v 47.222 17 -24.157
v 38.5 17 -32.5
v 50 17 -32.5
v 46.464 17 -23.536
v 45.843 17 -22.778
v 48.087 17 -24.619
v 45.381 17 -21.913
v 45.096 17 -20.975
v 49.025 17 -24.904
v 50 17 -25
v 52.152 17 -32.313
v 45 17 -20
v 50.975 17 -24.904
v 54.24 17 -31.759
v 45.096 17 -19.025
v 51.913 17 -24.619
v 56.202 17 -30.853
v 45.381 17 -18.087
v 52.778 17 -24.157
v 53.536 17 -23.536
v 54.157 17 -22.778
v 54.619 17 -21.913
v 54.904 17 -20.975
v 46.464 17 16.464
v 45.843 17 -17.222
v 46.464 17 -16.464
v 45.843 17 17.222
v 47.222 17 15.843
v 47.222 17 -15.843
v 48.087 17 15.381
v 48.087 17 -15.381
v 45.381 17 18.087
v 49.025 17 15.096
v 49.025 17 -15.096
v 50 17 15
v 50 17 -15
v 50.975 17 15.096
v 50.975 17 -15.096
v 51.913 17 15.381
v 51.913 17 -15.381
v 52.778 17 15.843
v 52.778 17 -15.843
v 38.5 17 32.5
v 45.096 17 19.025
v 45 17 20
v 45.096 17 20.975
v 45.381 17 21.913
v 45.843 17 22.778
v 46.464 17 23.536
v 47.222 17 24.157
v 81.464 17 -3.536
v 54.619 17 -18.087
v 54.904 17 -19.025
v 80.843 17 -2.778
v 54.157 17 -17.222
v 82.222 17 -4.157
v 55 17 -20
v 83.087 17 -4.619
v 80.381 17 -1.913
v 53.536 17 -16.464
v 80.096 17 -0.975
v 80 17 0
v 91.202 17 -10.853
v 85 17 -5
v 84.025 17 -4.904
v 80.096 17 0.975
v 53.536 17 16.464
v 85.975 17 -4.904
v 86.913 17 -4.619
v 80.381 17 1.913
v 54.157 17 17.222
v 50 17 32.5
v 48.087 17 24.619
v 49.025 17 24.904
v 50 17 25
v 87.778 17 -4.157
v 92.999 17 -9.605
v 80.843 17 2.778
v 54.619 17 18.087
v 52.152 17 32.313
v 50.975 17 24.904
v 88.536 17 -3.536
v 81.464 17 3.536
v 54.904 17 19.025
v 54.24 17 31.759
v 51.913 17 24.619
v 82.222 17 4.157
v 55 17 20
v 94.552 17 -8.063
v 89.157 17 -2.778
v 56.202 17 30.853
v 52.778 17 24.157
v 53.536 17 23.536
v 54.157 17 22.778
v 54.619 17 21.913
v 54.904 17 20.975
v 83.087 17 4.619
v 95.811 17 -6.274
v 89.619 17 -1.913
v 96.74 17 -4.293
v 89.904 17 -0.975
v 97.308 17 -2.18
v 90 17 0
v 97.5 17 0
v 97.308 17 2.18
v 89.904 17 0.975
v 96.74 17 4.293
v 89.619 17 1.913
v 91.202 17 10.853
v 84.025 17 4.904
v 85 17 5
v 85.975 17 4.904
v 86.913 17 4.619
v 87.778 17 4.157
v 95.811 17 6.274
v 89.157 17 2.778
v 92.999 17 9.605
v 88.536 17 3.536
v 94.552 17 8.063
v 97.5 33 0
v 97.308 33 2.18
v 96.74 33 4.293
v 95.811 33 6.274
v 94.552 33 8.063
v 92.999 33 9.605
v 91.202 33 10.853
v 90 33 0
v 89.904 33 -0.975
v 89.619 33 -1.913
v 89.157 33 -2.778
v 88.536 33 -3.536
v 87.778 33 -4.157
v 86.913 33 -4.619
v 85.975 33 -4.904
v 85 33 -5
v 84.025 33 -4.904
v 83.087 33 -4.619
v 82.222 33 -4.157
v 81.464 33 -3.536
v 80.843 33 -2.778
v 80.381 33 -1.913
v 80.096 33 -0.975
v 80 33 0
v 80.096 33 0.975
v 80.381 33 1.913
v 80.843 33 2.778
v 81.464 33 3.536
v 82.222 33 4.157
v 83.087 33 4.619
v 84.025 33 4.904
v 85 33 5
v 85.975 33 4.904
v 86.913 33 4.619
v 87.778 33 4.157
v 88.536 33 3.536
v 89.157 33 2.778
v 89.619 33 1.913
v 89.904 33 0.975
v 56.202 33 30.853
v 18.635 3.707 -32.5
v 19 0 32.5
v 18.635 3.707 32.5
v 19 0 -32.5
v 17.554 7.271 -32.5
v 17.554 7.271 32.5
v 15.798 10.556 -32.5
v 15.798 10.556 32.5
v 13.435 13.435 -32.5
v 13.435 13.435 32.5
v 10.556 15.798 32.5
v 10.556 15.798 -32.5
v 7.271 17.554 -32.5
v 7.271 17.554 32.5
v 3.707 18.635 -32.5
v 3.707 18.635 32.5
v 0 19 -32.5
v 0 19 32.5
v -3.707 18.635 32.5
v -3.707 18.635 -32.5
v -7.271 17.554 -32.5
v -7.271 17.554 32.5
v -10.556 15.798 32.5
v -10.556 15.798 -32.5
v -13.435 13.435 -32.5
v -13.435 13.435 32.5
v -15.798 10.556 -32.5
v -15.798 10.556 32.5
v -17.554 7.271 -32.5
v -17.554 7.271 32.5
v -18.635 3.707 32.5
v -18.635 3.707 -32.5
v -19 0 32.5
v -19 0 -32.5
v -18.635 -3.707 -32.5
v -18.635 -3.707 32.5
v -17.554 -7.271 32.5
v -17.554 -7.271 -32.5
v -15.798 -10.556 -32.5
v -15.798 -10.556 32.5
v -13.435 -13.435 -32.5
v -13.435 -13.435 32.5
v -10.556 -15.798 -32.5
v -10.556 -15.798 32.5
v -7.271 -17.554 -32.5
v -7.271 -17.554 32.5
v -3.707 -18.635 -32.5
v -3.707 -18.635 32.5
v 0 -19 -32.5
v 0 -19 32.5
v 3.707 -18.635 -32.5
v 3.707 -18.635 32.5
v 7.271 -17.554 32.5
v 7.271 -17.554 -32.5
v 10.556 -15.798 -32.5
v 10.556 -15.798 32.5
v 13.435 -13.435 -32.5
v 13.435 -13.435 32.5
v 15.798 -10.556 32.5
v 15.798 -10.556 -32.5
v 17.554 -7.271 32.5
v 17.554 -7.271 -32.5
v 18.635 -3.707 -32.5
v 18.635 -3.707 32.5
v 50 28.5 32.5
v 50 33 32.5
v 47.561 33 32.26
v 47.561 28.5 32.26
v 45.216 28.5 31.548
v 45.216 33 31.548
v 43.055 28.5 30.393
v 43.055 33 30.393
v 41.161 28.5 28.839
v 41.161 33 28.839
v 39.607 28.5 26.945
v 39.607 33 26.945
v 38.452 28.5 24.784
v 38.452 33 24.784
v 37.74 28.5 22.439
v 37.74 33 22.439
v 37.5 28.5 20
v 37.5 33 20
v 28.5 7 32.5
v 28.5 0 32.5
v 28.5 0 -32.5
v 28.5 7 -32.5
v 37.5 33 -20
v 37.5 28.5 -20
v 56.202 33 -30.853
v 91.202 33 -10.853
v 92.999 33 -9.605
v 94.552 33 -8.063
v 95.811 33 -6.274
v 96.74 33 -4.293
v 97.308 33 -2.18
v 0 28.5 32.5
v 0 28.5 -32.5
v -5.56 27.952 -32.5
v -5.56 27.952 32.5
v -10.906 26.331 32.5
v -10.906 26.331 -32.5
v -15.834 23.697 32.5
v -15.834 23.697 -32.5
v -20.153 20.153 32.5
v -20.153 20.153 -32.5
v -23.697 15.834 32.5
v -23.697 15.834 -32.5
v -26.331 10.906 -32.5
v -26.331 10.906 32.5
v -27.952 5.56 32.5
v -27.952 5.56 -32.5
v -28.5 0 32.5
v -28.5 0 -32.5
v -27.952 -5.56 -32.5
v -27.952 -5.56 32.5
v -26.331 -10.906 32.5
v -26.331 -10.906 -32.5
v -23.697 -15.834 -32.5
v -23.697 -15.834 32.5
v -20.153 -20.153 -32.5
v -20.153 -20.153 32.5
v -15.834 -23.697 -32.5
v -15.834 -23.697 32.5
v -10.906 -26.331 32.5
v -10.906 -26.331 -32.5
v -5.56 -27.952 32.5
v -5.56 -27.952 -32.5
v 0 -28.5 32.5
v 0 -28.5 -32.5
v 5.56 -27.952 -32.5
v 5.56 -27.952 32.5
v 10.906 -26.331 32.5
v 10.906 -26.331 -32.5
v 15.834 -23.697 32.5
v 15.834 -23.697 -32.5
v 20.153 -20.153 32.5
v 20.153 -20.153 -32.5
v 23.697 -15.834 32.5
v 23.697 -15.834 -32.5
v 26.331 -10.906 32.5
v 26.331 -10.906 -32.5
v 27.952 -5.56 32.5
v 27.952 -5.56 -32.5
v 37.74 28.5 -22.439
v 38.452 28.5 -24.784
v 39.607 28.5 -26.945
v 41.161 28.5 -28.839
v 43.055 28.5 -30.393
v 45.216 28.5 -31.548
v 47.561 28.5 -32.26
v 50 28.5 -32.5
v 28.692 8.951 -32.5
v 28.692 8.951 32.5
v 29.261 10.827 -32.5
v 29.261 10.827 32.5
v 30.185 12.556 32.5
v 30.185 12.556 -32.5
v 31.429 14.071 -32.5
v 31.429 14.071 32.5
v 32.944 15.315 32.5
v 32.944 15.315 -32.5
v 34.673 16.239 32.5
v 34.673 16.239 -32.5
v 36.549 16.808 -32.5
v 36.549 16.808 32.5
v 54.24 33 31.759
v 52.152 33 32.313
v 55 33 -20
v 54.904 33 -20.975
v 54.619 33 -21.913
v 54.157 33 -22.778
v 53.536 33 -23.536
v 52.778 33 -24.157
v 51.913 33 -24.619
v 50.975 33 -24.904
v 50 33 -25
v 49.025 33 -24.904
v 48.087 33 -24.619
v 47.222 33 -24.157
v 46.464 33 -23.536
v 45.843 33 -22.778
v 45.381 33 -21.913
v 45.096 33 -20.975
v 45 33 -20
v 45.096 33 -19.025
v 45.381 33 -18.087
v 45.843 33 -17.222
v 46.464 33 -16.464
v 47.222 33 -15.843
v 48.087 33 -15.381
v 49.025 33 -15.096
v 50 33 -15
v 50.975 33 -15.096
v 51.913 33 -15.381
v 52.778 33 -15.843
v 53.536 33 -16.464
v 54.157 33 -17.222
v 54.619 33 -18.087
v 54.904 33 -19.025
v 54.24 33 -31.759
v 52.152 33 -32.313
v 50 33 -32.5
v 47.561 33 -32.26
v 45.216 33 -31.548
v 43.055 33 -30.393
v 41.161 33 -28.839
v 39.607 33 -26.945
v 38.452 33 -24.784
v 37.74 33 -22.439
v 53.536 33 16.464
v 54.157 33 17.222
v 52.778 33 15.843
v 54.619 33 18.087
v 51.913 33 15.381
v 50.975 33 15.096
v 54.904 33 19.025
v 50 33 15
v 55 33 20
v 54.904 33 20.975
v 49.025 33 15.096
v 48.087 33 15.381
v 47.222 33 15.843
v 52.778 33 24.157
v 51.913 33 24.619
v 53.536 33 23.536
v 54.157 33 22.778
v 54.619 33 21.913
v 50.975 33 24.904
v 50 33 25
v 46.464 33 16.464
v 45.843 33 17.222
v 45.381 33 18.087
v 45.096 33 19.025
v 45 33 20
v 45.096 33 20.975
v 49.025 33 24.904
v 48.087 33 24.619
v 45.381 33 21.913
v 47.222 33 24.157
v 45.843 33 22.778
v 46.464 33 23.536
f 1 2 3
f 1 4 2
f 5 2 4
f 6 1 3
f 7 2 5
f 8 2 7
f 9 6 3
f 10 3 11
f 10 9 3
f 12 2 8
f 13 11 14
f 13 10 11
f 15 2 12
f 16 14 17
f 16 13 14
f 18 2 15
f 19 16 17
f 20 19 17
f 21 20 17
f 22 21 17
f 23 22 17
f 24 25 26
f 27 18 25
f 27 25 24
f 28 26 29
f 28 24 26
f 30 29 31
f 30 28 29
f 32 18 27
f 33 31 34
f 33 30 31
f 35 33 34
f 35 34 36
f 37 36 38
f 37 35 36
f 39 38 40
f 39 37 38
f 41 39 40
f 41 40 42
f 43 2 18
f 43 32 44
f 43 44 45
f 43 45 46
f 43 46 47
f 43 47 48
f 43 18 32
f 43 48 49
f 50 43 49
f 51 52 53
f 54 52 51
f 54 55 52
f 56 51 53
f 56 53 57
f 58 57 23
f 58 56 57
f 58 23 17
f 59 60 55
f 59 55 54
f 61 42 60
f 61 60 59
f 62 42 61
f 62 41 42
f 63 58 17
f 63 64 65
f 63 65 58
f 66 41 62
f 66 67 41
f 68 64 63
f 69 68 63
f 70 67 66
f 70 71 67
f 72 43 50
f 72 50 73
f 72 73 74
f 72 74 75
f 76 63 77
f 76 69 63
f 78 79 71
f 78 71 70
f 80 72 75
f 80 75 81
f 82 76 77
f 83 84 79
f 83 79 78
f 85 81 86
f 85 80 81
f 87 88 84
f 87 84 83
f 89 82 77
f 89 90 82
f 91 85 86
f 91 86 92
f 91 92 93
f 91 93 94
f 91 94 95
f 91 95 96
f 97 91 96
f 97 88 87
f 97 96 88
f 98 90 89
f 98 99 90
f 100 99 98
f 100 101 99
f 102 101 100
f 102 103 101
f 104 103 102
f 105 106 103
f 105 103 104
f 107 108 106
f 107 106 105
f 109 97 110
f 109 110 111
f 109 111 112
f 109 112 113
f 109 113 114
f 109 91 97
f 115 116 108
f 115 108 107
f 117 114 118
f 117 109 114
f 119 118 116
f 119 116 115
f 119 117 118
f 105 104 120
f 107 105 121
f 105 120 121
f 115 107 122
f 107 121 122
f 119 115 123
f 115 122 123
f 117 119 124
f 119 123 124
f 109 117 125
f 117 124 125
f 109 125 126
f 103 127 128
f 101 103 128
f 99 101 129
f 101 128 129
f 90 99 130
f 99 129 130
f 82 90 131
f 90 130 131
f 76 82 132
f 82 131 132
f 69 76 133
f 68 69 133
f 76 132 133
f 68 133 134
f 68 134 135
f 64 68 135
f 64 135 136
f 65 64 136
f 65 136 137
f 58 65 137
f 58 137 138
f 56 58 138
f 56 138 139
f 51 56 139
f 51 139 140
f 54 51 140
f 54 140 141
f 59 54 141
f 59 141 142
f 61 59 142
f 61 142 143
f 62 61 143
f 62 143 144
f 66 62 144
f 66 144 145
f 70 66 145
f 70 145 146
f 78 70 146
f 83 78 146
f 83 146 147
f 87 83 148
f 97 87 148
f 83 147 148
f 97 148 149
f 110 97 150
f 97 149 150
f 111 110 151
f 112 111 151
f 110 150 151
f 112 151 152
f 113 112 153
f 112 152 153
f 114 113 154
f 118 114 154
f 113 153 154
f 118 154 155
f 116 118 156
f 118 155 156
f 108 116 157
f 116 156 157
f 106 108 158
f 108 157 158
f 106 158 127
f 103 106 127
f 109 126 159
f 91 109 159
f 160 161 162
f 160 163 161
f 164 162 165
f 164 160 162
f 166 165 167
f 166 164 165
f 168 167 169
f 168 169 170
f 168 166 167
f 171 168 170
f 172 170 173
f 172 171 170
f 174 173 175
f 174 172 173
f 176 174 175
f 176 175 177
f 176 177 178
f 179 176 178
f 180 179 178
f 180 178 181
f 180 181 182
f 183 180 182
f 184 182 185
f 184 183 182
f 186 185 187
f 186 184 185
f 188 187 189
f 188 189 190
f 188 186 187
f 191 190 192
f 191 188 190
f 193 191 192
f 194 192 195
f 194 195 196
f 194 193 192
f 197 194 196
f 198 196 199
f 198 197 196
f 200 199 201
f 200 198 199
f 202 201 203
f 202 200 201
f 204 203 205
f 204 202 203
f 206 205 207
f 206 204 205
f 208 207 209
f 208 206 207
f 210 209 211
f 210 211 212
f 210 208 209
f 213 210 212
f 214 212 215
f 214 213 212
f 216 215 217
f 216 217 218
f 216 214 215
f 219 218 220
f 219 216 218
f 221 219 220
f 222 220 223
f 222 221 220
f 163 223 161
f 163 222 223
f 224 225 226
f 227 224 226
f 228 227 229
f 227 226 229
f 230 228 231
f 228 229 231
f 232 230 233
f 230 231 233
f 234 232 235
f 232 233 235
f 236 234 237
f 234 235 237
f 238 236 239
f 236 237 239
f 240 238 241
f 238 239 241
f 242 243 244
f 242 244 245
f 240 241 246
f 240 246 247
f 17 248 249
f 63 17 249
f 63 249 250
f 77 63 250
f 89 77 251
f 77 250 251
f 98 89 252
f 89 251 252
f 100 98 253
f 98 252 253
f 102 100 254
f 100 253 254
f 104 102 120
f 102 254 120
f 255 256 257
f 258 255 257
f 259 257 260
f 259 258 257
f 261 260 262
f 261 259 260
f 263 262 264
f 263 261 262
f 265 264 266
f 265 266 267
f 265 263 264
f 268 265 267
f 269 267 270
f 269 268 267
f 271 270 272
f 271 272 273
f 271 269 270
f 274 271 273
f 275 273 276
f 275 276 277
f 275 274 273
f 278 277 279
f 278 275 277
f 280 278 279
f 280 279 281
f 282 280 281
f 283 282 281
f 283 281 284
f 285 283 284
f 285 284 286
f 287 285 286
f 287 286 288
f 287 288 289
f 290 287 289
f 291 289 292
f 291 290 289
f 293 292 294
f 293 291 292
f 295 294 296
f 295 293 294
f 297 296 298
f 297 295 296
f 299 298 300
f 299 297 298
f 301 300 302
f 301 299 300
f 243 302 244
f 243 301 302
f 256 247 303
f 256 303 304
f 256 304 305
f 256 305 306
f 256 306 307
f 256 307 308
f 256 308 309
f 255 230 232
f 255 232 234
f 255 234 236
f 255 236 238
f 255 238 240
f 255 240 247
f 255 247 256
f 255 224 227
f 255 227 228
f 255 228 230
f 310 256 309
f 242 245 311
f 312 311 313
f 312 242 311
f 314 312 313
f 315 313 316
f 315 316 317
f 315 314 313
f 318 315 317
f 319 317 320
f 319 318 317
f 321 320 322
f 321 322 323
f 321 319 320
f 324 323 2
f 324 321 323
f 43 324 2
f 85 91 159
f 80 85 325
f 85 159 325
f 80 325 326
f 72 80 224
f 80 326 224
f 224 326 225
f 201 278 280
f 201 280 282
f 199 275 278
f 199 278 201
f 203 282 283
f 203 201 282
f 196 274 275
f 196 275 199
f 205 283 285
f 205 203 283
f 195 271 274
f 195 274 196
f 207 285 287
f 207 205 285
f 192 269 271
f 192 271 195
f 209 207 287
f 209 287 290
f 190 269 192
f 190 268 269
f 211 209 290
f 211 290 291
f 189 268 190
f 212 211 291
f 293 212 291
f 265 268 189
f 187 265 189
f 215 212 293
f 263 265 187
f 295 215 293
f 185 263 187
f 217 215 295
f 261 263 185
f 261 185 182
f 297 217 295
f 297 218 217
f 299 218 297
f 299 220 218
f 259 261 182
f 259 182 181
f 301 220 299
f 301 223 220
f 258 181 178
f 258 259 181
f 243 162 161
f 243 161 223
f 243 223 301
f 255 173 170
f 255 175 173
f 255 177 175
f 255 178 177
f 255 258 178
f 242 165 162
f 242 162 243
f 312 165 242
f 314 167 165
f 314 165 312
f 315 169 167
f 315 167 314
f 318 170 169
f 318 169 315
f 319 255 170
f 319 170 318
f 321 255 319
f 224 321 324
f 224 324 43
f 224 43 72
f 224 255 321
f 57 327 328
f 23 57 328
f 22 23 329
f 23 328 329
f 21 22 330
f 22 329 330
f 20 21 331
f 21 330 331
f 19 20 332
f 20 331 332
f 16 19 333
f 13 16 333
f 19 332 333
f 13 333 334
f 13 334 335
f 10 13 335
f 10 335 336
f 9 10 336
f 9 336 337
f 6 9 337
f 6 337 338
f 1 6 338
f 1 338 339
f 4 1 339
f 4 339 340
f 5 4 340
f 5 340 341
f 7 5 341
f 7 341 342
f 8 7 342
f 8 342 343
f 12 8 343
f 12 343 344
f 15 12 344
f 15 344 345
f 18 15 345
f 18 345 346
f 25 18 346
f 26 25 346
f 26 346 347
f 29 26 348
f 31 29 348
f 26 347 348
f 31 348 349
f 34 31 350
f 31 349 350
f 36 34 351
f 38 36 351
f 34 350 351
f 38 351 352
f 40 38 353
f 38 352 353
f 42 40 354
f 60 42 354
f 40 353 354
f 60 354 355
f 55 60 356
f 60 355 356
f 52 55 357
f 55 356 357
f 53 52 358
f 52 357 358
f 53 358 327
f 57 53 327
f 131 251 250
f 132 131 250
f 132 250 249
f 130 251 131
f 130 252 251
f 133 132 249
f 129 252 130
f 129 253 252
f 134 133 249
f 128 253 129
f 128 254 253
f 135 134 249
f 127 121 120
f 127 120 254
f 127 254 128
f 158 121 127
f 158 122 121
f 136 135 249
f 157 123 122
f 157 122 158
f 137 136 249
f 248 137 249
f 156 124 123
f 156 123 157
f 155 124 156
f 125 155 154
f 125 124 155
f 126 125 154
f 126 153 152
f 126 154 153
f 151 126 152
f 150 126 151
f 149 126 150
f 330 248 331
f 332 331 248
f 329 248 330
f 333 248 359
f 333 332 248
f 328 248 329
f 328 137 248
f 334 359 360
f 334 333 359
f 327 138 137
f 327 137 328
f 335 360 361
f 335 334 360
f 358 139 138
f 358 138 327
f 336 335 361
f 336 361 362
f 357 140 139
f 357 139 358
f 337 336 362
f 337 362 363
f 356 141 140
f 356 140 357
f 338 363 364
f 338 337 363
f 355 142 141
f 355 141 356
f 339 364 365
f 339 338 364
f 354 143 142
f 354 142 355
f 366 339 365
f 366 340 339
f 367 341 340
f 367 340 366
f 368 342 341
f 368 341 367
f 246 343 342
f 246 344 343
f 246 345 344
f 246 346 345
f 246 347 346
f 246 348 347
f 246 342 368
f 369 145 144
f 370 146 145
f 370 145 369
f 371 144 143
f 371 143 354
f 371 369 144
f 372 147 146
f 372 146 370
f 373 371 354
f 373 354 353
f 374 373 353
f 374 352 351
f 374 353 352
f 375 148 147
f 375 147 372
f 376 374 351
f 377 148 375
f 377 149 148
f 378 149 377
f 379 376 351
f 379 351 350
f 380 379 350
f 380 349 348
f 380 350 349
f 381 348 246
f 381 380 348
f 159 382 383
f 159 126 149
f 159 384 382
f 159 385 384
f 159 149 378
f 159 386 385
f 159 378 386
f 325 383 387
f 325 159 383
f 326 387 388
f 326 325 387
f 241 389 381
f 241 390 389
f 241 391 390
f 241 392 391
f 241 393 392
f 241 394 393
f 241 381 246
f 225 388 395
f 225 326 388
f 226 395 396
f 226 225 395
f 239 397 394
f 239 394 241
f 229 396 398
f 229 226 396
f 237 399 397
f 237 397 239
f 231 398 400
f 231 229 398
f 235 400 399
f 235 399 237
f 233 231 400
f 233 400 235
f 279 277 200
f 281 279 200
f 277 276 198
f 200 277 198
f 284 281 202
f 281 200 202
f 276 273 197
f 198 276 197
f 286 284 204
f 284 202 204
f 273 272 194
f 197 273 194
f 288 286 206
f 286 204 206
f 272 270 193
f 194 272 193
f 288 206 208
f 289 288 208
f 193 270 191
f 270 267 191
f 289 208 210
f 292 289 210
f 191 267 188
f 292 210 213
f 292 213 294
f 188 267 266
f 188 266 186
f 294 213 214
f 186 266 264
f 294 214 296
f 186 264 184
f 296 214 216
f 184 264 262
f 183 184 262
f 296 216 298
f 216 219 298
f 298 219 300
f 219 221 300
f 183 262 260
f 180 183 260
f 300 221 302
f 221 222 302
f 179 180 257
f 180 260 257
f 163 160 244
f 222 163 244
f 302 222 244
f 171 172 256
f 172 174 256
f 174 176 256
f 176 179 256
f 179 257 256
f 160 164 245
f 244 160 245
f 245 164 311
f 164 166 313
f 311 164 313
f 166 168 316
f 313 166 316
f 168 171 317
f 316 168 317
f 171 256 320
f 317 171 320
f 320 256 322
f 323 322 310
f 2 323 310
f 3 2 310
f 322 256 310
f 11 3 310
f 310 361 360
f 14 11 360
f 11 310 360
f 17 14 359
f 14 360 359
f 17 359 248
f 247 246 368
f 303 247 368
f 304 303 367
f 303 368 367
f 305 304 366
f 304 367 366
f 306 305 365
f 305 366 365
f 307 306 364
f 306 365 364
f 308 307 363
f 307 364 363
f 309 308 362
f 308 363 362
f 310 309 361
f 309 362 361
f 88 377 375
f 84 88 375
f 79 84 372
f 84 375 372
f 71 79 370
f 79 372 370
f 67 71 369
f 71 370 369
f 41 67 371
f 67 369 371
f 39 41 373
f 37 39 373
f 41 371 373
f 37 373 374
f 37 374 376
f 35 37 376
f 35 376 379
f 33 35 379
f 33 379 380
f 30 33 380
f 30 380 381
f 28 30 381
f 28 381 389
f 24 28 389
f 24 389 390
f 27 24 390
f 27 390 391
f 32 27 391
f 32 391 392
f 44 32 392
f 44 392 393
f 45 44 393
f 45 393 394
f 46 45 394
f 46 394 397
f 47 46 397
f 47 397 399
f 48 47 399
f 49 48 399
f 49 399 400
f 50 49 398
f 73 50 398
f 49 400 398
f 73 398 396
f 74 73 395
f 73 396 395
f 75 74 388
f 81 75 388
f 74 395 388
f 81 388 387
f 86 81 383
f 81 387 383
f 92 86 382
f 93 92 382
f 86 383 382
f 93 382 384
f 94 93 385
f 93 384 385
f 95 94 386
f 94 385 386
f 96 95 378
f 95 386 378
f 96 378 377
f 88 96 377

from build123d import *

# Parameters (mm, degrees)
SKETCH1_R           = 19
BOSS_EXTRUDE1_DEPTH = 32.5
CUT_EXTRUDE3_REACH  = 121.77
SKETCH2_R           = 5
CUT_EXTRUDE4_DEPTH  = 4.5


with BuildPart() as part:
    # Sketch1 → Boss-Extrude1 (new, symmetric)
    with BuildSketch(Plane.XY):
        with BuildLine():
            Line((37.5, 28.5), (0, 28.5))
            ThreePointArc((0, 28.5), (-20.152543264, -20.152543264), (28.5, 0))
            Line((28.5, 0), (28.5, 7))
            ThreePointArc((28.5, 7), (31.428932188, 14.071067812), (38.5, 17))
            Line((38.5, 17), (97.5, 17))
            Line((97.5, 17), (97.5, 33))
            Line((97.5, 33), (37.5, 33))
            Line((37.5, 33), (37.5, 28.5))
        make_face()
        Circle(SKETCH1_R, mode=Mode.SUBTRACT)
    extrude(amount=BOSS_EXTRUDE1_DEPTH, both=True)

    # Sketch2 → Cut-Extrude3 (cut, up to next)
    with BuildSketch(Plane(origin=(0, 33, 0), x_dir=(1, 0, 0), z_dir=(0, 1, 0)), mode=Mode.PRIVATE) as cut_extrude3_sk1:
        with BuildLine():
            ThreePointArc((56.201736729, -30.853039277), (53.208349189, -32.08124561), (50, -32.5))
            Line((50, -32.5), (97.5, -32.5))
            Line((97.5, -32.5), (97.5, 1.68e-07))
            ThreePointArc((97.5, 1.68e-07), (95.811376206, -6.274085155), (91.201736729, -10.853039277))
            Line((91.201736729, -10.853039277), (56.201736729, -30.853039277))
        make_face()
    cut_extrude3_tool1 = extrude(cut_extrude3_sk1.sketch, amount=-CUT_EXTRUDE3_REACH, mode=Mode.PRIVATE) & part.part
    # Sketch2 → Cut-Extrude3 (cut, up to next)
    with BuildSketch(Plane(origin=(0, 33, 0), x_dir=(1, 0, 0), z_dir=(0, 1, 0)), mode=Mode.PRIVATE) as cut_extrude3_sk2:
        with BuildLine():
            Line((97.5, 32.5), (50, 32.5))
            ThreePointArc((50, 32.5), (53.208349189, 32.08124561), (56.201736729, 30.853039277))
            Line((56.201736729, 30.853039277), (91.201736729, 10.853039277))
            ThreePointArc((91.201736729, 10.853039277), (95.811376122, 6.2740853), (97.5, 1.68e-07))
            Line((97.5, 1.68e-07), (97.5, 32.5))
        make_face()
    cut_extrude3_tool2 = extrude(cut_extrude3_sk2.sketch, amount=-CUT_EXTRUDE3_REACH, mode=Mode.PRIVATE) & part.part
    # Sketch2 → Cut-Extrude3 (cut, up to next)
    with BuildSketch(Plane(origin=(0, 33, 0), x_dir=(1, 0, 0), z_dir=(0, 1, 0)), mode=Mode.PRIVATE) as cut_extrude3_sk3:
        with Locations((50, 20)):
            Circle(SKETCH2_R)
    cut_extrude3_tool3 = extrude(cut_extrude3_sk3.sketch, amount=-CUT_EXTRUDE3_REACH, mode=Mode.PRIVATE) & part.part
    # Sketch2 → Cut-Extrude3 (cut, up to next)
    with BuildSketch(Plane(origin=(0, 33, 0), x_dir=(1, 0, 0), z_dir=(0, 1, 0)), mode=Mode.PRIVATE) as cut_extrude3_sk4:
        with Locations((50, -20)):
            Circle(SKETCH2_R)
    cut_extrude3_tool4 = extrude(cut_extrude3_sk4.sketch, amount=-CUT_EXTRUDE3_REACH, mode=Mode.PRIVATE) & part.part
    # Sketch2 → Cut-Extrude3 (cut, up to next)
    with BuildSketch(Plane(origin=(0, 33, 0), x_dir=(1, 0, 0), z_dir=(0, 1, 0)), mode=Mode.PRIVATE) as cut_extrude3_sk5:
        with Locations((85, 0)):
            Circle(SKETCH2_R)
    cut_extrude3_tool5 = extrude(cut_extrude3_sk5.sketch, amount=-CUT_EXTRUDE3_REACH, mode=Mode.PRIVATE) & part.part
    add(cut_extrude3_tool1.solids().sort_by_distance((82.925685, 33, 23.833798))[0], mode=Mode.SUBTRACT)
    add(cut_extrude3_tool2.solids().sort_by_distance((82.925685, 33, -23.833798))[0], mode=Mode.SUBTRACT)
    add(cut_extrude3_tool3.solids().sort_by_distance((50, 33, -20))[0], mode=Mode.SUBTRACT)
    add(cut_extrude3_tool4.solids().sort_by_distance((50, 33, 20))[0], mode=Mode.SUBTRACT)
    add(cut_extrude3_tool5.solids().sort_by_distance((85, 33, 0))[0], mode=Mode.SUBTRACT)

    # Sketch2<4> → Cut-Extrude4 (cut)
    with BuildSketch(Plane(origin=(0, 33, 0), x_dir=(1, 0, 0), z_dir=(0, 1, 0))):
        with BuildLine():
            ThreePointArc((50, -32.5), (41.161165235, -28.838834765), (37.5, -20))
            Line((37.5, -20), (37.5, -32.5))
            Line((37.5, -32.5), (50, -32.5))
        make_face()
        with BuildLine():
            Line((37.5, 32.5), (37.5, 20))
            ThreePointArc((37.5, 20), (41.161165235, 28.838834765), (50, 32.5))
            Line((50, 32.5), (37.5, 32.5))
        make_face()
    extrude(amount=-CUT_EXTRUDE4_DEPTH, mode=Mode.SUBTRACT)


solid = part.part
